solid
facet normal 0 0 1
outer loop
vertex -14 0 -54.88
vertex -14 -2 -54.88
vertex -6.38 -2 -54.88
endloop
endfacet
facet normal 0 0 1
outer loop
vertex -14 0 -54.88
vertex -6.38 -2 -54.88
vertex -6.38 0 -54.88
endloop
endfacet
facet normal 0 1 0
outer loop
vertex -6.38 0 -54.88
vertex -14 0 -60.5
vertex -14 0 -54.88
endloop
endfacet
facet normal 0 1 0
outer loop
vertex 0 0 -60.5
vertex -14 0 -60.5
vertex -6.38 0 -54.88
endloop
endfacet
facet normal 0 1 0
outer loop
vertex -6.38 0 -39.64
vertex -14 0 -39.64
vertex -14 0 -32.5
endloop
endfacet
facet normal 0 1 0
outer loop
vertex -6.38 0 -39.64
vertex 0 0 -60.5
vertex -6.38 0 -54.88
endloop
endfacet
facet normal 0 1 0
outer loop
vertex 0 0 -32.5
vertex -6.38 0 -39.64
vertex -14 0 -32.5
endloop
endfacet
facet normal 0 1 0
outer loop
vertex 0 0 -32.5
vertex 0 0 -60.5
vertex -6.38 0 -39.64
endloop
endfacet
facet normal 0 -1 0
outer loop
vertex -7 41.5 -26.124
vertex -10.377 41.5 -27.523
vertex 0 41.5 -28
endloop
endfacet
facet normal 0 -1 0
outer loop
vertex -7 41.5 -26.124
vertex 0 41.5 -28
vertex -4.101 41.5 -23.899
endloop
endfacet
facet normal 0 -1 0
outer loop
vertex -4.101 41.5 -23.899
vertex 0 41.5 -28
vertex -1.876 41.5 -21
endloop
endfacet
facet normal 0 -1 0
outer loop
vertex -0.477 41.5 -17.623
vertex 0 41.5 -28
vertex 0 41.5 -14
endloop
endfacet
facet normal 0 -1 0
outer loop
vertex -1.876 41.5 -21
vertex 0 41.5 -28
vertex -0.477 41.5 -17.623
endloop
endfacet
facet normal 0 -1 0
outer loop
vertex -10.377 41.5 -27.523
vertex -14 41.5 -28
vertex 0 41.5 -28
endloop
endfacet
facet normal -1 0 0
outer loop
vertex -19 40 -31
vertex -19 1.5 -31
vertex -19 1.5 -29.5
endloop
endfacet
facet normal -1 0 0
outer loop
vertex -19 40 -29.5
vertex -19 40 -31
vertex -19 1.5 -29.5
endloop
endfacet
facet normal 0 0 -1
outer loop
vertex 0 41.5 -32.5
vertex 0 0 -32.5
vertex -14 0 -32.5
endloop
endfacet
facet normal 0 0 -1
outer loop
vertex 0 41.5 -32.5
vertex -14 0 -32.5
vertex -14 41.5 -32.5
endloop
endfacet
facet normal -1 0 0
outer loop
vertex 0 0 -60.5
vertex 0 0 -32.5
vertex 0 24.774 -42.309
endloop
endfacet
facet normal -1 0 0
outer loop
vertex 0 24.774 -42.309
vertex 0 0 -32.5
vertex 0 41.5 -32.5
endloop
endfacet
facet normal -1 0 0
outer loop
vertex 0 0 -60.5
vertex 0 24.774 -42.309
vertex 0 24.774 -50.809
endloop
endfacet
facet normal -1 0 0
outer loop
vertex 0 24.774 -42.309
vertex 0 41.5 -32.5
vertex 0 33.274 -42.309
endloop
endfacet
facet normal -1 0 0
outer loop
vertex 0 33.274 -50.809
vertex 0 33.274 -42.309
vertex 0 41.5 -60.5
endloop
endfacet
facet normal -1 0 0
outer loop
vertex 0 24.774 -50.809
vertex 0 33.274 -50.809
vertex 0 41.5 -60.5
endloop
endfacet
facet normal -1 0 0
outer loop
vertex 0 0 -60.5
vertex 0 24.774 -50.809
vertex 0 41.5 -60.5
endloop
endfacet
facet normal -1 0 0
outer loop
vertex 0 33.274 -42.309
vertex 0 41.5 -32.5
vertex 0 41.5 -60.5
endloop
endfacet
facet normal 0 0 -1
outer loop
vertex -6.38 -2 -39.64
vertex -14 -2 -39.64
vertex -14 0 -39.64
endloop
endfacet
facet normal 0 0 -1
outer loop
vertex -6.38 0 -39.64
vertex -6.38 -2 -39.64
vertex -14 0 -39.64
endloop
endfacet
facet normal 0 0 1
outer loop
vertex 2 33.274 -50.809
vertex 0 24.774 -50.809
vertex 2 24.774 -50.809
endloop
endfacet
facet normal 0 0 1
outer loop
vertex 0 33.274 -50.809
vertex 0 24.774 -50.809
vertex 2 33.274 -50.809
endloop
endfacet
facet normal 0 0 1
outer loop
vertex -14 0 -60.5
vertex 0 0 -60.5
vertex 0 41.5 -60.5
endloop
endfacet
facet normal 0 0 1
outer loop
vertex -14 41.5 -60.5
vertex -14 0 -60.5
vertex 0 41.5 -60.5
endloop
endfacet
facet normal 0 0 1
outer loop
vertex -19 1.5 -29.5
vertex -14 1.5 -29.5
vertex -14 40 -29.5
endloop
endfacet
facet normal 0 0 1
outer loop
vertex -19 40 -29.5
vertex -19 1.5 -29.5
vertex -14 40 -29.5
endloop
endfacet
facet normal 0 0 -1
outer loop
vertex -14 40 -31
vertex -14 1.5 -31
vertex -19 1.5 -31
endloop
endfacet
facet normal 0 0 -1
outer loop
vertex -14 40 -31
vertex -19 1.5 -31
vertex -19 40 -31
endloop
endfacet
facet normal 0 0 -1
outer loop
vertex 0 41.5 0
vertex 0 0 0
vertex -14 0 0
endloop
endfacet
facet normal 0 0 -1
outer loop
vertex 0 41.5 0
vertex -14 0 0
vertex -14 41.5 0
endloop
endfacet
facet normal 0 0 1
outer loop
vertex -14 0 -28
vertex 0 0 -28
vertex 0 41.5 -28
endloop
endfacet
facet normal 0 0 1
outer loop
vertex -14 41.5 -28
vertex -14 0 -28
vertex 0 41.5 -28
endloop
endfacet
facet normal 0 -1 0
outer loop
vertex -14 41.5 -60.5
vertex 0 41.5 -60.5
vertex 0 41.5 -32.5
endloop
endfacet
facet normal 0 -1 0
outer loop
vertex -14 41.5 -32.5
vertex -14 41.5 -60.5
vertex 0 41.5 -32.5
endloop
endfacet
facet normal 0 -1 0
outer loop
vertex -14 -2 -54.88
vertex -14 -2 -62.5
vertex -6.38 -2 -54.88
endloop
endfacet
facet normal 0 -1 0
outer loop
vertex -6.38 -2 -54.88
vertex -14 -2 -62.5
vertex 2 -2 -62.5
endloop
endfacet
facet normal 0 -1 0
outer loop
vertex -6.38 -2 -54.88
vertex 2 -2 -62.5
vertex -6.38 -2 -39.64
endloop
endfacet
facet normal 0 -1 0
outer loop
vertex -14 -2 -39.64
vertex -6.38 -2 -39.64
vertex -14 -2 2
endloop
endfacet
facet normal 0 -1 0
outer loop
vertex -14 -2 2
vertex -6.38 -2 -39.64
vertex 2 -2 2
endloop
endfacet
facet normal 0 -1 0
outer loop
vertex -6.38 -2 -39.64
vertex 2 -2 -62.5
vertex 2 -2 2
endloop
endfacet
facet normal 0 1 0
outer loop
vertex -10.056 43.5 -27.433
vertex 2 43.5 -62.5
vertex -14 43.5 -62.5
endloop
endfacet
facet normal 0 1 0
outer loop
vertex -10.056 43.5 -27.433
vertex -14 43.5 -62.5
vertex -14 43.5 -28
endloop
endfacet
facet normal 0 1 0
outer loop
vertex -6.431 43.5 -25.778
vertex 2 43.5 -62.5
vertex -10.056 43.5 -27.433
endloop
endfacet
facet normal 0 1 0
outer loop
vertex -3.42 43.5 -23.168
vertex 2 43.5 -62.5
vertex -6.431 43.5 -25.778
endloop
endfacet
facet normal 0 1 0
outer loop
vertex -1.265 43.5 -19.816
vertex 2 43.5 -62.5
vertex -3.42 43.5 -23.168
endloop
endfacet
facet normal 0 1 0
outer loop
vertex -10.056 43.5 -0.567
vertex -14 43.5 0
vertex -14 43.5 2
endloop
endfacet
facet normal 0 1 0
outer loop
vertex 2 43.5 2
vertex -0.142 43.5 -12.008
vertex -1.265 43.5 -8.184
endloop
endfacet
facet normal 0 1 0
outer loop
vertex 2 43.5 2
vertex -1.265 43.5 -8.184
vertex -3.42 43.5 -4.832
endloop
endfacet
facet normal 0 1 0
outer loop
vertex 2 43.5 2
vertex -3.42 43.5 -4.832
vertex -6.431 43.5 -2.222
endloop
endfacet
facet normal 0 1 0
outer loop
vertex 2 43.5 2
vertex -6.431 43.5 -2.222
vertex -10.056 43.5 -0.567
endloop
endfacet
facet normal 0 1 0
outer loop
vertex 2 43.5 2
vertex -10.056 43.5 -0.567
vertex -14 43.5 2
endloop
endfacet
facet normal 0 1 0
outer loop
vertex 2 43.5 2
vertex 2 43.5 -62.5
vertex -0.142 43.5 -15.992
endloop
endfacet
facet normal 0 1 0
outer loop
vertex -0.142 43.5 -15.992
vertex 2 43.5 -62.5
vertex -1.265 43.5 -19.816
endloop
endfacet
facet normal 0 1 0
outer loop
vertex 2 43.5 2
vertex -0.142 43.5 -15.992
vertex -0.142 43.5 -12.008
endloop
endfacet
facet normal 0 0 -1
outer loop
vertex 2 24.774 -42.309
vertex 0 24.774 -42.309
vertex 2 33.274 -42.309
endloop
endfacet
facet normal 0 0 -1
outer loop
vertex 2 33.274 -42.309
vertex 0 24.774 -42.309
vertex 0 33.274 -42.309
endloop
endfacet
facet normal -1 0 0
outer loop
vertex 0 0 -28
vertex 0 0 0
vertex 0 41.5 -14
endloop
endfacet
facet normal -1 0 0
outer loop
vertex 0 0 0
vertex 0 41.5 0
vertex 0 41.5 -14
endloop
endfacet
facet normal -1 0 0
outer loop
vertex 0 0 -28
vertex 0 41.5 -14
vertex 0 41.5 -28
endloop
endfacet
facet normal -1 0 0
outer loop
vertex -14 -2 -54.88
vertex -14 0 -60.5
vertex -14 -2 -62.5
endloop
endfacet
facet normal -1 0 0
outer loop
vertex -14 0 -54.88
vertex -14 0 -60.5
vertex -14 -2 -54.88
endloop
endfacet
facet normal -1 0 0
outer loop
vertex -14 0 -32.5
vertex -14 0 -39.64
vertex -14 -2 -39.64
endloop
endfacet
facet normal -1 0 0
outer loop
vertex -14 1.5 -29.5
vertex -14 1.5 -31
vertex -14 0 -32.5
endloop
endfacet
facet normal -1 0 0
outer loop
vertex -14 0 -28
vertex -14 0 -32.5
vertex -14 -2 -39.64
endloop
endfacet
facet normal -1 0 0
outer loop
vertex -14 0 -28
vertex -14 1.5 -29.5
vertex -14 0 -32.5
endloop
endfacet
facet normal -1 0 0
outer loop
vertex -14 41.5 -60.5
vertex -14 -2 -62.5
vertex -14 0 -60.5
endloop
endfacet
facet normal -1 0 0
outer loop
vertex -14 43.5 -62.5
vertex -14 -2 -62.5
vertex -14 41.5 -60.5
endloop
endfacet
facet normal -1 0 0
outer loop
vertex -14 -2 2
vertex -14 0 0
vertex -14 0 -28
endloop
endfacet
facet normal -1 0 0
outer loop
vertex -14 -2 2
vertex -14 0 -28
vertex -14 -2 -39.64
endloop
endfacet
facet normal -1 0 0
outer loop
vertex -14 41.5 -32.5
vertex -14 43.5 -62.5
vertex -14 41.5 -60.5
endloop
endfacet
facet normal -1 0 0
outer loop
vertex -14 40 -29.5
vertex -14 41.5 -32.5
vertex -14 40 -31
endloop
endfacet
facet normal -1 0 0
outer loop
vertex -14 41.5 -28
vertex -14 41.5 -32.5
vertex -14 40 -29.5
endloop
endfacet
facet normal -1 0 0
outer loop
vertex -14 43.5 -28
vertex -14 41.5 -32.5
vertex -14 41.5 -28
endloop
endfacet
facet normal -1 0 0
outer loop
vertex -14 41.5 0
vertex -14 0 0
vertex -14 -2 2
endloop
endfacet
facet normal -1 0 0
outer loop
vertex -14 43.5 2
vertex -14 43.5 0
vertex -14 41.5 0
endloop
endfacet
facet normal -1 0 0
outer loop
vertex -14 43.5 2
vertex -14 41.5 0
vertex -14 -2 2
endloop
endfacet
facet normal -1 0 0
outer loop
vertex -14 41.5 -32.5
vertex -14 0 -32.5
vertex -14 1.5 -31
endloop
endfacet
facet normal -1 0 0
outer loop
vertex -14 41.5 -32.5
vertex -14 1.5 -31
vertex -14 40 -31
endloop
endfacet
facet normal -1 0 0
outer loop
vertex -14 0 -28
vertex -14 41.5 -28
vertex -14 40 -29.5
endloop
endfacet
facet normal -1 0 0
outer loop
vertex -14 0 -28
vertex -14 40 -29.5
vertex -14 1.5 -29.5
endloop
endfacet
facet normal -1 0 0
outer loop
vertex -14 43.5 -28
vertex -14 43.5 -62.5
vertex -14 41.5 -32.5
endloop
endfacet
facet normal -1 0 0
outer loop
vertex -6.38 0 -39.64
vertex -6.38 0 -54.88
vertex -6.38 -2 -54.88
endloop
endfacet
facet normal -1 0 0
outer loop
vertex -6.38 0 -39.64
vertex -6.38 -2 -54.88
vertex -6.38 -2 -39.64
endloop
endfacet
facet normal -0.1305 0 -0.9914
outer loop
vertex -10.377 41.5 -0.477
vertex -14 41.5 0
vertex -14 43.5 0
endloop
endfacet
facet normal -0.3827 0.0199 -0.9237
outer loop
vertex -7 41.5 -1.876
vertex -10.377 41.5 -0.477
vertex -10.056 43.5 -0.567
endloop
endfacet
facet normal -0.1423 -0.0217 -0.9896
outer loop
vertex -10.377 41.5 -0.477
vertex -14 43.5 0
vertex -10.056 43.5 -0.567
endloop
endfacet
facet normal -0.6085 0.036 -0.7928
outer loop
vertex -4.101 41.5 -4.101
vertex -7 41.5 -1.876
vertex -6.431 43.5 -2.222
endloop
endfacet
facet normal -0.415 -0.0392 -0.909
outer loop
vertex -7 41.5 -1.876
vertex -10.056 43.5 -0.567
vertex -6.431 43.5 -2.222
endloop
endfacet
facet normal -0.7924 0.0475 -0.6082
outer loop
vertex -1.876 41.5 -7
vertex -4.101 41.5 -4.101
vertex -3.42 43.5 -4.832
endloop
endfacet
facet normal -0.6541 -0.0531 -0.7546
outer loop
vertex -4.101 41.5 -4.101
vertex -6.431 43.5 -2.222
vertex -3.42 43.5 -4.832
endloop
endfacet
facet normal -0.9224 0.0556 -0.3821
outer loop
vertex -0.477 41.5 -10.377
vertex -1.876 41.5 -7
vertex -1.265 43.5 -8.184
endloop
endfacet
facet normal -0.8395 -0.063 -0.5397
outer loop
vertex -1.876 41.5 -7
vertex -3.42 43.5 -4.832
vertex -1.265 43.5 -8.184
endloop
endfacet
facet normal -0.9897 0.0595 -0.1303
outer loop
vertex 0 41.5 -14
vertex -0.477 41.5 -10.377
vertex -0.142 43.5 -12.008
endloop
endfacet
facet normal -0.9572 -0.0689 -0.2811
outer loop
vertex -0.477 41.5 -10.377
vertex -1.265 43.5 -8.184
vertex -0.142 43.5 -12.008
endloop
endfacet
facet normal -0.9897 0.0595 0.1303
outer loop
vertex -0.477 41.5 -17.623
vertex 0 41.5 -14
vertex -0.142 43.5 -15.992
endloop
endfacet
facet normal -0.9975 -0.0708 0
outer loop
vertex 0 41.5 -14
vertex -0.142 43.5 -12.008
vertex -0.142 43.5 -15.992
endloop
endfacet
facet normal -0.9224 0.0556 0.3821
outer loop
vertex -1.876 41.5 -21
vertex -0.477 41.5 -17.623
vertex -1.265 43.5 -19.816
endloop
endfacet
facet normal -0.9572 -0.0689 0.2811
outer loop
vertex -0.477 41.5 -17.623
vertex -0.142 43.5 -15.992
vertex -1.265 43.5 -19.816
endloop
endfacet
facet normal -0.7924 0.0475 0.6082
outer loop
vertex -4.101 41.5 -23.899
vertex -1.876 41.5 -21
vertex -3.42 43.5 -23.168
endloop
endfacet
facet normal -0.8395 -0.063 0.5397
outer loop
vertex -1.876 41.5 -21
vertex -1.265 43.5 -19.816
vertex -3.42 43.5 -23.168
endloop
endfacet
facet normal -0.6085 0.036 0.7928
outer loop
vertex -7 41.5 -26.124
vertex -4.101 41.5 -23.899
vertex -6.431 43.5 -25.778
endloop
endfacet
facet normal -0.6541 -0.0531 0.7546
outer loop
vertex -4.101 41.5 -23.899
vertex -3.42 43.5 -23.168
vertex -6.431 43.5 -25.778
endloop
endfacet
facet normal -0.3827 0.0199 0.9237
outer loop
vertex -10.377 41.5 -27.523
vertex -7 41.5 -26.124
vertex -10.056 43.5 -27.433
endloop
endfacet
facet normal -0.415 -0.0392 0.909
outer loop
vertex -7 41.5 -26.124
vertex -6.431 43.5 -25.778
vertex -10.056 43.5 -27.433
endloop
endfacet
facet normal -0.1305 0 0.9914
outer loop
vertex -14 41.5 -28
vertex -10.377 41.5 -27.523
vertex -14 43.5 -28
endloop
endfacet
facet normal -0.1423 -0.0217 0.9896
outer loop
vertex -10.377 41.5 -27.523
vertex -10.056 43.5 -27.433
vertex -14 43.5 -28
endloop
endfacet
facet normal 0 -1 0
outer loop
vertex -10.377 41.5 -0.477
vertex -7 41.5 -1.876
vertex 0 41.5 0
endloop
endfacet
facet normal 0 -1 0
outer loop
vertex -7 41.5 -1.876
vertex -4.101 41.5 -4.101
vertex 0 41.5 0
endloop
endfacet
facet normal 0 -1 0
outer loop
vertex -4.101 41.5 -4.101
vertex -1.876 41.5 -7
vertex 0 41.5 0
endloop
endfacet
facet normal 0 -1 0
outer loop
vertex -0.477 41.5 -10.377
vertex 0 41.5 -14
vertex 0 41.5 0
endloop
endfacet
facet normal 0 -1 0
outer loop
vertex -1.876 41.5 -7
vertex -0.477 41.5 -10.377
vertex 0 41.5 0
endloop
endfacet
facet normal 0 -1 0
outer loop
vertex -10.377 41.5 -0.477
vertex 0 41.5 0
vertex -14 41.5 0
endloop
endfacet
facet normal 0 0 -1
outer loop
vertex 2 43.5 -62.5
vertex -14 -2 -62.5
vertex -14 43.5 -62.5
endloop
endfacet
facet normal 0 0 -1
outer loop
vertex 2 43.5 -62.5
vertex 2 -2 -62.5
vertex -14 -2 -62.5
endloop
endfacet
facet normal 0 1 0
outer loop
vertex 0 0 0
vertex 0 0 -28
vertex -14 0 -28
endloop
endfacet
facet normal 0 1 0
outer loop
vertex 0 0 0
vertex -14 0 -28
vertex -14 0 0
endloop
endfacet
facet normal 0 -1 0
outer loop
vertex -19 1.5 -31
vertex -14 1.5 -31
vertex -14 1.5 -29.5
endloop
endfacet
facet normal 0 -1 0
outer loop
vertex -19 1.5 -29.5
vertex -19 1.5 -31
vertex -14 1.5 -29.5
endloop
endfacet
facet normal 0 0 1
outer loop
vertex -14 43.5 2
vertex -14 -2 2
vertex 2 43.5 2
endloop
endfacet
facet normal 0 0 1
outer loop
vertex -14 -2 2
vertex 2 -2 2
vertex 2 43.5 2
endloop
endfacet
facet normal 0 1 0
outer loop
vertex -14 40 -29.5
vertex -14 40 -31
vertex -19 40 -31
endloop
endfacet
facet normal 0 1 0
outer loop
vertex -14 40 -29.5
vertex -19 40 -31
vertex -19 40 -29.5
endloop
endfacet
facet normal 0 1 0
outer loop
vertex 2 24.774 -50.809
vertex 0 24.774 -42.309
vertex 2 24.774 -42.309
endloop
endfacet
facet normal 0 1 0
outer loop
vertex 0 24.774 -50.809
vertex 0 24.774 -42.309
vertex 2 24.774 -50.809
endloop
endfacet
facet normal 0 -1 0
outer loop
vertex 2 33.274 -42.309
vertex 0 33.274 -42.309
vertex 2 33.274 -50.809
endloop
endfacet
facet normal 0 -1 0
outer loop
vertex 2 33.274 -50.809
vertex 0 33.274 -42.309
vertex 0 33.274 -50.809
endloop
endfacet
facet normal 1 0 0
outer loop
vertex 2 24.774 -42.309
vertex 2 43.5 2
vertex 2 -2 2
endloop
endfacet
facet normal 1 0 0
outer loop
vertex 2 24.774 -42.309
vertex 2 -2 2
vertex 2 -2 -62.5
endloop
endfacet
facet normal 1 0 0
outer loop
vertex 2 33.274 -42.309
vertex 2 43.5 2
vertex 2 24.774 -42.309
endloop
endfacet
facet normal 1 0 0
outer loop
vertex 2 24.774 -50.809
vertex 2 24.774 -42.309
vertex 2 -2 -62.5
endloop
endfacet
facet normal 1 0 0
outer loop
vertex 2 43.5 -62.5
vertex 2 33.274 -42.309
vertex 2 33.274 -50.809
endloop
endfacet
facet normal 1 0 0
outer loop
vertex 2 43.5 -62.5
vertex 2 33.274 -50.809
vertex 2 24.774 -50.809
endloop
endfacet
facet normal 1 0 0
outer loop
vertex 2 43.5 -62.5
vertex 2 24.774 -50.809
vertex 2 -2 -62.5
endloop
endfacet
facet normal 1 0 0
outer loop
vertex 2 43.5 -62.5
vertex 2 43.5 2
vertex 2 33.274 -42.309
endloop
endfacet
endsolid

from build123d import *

# Parameters (mm, degrees)
SKETCH1_W           = 64.5
SKETCH1_H           = 45.5
SKETCH1_W_2         = 8.5
SKETCH1_H_2         = 8.5
BOSS_EXTRUDE1_DEPTH = 2
SKETCH2_W           = 64.5
SKETCH2_H           = 45.5
SKETCH2_W_2         = 28
SKETCH2_H_2         = 41.5
BOSS_EXTRUDE2_DEPTH = 14
CUT_EXTRUDE1_REACH  = 80.565
SKETCH3_R           = 14
SKETCH4_W           = 1.5
SKETCH4_H           = 38.5
BOSS_EXTRUDE3_DEPTH = 5
SKETCH5_W           = 15.24
SKETCH5_H           = 2
CUT_EXTRUDE2_DEPTH  = 7.62


with BuildPart() as part:
    # Sketch1 → Boss-Extrude1 (new body)
    with BuildSketch(Plane(origin=(0, 0, 0), x_dir=(0, 0, -1), z_dir=(1, 0, 0))):
        with Locations((30.25, 20.75)):
            Rectangle(SKETCH1_W, SKETCH1_H)
        with Locations((46.5590026, 29.024)):
            Rectangle(SKETCH1_W_2, SKETCH1_H_2, mode=Mode.SUBTRACT)
    extrude(amount=BOSS_EXTRUDE1_DEPTH)

    # Sketch2 → Boss-Extrude2 (add)
    with BuildSketch(Plane.ZY):
        with Locations((-30.25, 20.75)):
            Rectangle(SKETCH2_W, SKETCH2_H)
        with Locations((-46.5, 20.75)):
            Rectangle(SKETCH2_W_2, SKETCH2_H_2, mode=Mode.SUBTRACT)
        with Locations((-14, 20.75)):
            Rectangle(SKETCH2_W_2, SKETCH2_H_2, mode=Mode.SUBTRACT)
    extrude(amount=BOSS_EXTRUDE2_DEPTH)

    # Sketch3 → Cut-Extrude1 (cut, up to next)
    with BuildSketch(Plane(origin=(0, 43.5, 0), x_dir=(1, 0, 0), z_dir=(0, 1, 0)), mode=Mode.PRIVATE) as cut_extrude1_sk1:
        with Locations((-14, 14)):
            Circle(SKETCH3_R)
    cut_extrude1_tool1 = extrude(cut_extrude1_sk1.sketch, amount=-CUT_EXTRUDE1_REACH, mode=Mode.PRIVATE) & part.part
    add(cut_extrude1_tool1.solids().sort_by_distance((-14, 43.5, -14))[0], mode=Mode.SUBTRACT)

    # Sketch4 → Boss-Extrude3 (add)
    with BuildSketch(Plane.ZY.offset(14)):
        with Locations((-30.25, 20.75)):
            Rectangle(SKETCH4_W, SKETCH4_H)
    extrude(amount=BOSS_EXTRUDE3_DEPTH)

    # Sketch5 → Cut-Extrude2 (cut)
    with BuildSketch(Plane.ZY.offset(14)):
        with Locations((-47.26, -1)):
            Rectangle(SKETCH5_W, SKETCH5_H)
    extrude(amount=-CUT_EXTRUDE2_DEPTH, mode=Mode.SUBTRACT)


solid = part.part
